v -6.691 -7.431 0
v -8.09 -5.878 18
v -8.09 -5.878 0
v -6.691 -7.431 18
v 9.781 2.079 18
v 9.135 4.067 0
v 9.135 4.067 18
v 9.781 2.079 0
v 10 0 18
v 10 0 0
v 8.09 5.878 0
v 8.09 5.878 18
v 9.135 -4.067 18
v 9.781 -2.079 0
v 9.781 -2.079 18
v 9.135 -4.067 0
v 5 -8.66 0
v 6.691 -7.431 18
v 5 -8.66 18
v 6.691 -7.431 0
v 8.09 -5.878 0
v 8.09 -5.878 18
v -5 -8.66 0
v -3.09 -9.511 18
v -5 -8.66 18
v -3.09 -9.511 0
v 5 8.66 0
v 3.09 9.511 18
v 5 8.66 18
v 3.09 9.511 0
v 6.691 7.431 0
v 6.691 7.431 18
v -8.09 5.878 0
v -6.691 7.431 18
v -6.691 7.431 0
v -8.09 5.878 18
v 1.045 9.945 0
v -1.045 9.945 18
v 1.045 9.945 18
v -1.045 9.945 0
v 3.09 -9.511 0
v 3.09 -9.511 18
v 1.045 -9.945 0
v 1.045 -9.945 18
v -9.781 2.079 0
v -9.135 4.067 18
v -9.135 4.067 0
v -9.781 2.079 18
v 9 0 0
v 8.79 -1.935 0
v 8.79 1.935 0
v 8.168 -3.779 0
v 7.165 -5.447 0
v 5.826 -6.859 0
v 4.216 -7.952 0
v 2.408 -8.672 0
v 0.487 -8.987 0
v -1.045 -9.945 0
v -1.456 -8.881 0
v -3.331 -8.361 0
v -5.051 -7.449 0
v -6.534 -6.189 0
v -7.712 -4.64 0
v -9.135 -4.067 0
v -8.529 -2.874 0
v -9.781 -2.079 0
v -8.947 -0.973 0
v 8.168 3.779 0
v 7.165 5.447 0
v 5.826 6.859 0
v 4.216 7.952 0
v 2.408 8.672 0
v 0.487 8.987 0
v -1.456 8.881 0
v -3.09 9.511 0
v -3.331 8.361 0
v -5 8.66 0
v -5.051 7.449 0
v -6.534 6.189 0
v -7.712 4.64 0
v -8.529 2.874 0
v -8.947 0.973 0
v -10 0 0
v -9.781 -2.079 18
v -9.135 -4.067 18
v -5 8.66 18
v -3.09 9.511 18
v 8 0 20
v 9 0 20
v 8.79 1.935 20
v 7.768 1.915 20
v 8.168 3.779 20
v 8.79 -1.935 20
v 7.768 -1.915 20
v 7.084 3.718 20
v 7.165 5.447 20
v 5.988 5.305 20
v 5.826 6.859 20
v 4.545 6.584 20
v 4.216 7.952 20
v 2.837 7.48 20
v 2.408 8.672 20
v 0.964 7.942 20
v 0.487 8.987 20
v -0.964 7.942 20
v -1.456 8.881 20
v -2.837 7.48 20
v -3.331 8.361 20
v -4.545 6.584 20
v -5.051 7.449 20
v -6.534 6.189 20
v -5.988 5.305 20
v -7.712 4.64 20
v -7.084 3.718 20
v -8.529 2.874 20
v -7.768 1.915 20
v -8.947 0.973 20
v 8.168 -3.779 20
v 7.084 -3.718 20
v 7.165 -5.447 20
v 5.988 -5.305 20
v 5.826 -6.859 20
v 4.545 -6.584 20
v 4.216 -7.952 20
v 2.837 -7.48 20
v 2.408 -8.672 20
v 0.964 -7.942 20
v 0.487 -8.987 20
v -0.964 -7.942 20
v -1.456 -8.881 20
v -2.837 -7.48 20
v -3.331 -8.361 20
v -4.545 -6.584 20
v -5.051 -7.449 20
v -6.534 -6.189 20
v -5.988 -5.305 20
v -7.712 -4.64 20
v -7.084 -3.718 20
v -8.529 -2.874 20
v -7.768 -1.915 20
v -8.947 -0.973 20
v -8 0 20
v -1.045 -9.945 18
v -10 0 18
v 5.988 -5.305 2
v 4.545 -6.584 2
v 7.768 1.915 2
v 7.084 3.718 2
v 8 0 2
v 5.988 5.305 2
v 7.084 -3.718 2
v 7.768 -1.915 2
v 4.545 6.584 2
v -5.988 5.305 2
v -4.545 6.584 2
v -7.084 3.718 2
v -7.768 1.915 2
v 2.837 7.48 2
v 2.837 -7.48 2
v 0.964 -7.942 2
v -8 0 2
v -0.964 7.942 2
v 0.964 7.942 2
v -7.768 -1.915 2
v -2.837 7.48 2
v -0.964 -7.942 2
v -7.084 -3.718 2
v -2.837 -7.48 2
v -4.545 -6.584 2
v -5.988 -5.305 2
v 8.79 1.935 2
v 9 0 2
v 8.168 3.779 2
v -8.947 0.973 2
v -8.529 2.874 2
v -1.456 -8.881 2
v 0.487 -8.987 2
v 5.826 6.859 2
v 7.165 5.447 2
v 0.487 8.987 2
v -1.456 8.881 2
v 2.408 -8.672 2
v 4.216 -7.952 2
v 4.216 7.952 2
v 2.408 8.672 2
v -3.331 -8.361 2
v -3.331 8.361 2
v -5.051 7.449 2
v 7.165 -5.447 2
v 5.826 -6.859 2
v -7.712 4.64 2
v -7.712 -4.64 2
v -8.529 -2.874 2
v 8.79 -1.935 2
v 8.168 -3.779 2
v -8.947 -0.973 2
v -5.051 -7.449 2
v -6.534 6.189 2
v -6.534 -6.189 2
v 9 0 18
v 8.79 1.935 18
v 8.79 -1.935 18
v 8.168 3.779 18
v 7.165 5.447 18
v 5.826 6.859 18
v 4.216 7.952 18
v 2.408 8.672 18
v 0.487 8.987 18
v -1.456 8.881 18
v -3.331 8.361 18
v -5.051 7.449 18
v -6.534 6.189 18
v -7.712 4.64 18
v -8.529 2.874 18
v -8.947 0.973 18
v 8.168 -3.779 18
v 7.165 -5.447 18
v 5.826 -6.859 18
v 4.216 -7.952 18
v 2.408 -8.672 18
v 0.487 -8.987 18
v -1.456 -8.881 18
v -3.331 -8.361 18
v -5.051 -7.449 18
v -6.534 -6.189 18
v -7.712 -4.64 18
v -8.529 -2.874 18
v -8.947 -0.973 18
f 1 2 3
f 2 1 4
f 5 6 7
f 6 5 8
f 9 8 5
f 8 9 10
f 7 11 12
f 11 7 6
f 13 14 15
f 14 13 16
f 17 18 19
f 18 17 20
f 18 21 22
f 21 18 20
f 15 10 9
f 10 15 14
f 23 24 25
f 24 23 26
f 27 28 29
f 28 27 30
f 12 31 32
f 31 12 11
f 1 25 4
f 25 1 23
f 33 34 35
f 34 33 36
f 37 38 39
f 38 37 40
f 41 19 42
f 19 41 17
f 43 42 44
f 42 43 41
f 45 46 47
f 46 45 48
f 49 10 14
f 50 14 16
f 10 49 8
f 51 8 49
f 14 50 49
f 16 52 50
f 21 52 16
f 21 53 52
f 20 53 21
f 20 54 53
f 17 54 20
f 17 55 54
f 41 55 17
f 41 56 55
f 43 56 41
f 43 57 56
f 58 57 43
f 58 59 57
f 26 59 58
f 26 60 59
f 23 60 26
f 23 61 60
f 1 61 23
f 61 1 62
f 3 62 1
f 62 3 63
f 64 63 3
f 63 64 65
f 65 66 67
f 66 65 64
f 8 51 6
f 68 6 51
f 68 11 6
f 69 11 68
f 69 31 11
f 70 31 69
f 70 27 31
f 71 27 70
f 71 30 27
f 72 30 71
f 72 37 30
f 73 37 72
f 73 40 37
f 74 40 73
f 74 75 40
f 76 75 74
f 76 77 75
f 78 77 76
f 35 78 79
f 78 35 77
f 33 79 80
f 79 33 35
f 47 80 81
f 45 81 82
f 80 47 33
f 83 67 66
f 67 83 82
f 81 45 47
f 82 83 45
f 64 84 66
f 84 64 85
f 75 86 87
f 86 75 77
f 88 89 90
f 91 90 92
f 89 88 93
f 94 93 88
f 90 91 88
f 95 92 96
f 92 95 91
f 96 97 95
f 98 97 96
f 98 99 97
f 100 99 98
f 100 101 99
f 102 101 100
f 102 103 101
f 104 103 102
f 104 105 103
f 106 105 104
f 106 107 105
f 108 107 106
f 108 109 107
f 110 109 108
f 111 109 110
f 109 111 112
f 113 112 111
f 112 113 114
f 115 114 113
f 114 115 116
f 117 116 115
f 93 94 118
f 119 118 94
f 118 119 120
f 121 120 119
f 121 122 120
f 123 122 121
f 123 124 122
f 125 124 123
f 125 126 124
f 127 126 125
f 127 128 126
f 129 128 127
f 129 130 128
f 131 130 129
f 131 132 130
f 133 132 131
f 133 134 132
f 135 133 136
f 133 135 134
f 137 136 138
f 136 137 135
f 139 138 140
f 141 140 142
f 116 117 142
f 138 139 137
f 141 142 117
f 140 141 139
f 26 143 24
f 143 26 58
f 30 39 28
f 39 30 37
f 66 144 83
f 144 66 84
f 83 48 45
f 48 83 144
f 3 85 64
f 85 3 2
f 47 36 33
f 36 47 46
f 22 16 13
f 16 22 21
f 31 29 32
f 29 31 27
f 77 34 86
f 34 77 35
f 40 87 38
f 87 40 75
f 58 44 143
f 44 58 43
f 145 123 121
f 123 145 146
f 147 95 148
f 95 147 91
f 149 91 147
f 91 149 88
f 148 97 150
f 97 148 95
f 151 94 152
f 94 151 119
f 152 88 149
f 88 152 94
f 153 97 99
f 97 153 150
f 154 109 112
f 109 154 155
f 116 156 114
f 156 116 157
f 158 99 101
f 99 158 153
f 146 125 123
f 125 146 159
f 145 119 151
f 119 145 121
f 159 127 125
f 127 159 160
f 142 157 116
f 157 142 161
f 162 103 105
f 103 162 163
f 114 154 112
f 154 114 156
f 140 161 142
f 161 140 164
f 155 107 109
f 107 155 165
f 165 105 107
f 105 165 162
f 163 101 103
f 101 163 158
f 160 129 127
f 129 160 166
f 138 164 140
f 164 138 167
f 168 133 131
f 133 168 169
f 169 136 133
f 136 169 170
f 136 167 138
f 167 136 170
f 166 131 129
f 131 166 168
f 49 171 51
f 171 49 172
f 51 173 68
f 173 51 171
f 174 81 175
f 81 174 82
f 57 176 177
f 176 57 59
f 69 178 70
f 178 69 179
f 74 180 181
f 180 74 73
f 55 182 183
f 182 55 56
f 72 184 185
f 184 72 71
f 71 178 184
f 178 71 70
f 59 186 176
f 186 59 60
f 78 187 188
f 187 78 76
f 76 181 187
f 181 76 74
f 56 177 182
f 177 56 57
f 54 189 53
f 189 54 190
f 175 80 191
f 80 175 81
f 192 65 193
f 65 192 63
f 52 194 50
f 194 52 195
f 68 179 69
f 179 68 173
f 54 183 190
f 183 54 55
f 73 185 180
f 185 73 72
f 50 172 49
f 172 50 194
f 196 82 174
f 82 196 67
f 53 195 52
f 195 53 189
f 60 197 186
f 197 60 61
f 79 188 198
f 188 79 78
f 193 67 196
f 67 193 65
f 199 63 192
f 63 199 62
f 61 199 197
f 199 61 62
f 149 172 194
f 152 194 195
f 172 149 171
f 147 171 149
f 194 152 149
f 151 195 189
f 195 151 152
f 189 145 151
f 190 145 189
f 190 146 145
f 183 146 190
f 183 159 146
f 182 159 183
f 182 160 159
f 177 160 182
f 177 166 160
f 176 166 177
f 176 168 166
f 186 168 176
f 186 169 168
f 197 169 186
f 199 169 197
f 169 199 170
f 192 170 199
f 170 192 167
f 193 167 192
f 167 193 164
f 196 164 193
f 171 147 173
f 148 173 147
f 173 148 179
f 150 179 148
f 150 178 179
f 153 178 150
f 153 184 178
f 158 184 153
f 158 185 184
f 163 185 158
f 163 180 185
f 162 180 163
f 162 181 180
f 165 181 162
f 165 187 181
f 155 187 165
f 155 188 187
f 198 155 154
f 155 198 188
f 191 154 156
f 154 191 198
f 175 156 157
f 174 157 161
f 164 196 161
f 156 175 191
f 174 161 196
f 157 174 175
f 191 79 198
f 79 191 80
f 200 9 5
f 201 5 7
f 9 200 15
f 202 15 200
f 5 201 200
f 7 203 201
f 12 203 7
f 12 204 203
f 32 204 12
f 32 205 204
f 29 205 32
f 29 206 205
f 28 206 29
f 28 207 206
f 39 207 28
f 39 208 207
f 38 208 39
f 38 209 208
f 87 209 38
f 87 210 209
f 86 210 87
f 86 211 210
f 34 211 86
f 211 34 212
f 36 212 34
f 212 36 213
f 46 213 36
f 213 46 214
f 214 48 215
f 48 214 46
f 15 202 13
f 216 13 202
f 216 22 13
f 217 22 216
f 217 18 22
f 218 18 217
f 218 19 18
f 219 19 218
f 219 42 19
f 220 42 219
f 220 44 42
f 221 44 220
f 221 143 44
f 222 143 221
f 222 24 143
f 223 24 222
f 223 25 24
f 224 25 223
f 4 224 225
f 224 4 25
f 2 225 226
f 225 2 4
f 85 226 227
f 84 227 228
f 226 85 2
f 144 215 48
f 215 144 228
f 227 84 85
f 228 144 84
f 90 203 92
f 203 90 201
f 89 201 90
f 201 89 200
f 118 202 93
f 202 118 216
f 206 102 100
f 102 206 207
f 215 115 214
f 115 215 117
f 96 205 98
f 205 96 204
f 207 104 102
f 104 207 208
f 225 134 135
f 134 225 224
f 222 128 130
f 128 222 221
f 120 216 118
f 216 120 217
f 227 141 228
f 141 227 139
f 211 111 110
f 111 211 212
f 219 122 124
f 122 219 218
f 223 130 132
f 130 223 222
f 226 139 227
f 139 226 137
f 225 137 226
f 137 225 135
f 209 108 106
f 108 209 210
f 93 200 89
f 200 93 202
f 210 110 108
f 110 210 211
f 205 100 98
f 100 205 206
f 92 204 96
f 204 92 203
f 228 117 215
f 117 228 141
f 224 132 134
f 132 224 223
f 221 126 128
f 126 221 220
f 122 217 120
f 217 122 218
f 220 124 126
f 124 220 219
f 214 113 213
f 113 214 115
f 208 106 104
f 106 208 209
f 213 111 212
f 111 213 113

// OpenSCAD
// Section

module pipe(inner, outer, length) {
  difference() {
    cylinder(r=outer, h=length);
    cylinder(r=inner, h=length);
  }
}

// so other modules can see these values
function coupler_height () = 2;

module coupler(inner, outer, top){
  h = coupler_height();
  w = (outer - inner) / 2;
  if (top) {
    translate([0,0,-h]) pipe(inner+w, outer, h);
  } else {
    pipe(inner, outer-w, h);
  }
}


module segment(inner, outer, length) {
  length = length + 2 * coupler_height();
  difference() {
    pipe(inner, outer, length);
    coupler(inner, outer, false);
    translate([0,0,length]) coupler(inner, outer, true);
  }
}

module first_segment(inner, outer, length) {
  length = length + coupler_height();
  difference() {
    pipe(inner, outer, length);
    translate([0,0,length]) coupler(inner, outer, true);
  }
}

module last_segment(inner, outer, length) {
  length = length + coupler_height();
  difference() {
    pipe(inner, outer, length);
    coupler(inner, outer, false);
  }
}

segment(8,10,16);
